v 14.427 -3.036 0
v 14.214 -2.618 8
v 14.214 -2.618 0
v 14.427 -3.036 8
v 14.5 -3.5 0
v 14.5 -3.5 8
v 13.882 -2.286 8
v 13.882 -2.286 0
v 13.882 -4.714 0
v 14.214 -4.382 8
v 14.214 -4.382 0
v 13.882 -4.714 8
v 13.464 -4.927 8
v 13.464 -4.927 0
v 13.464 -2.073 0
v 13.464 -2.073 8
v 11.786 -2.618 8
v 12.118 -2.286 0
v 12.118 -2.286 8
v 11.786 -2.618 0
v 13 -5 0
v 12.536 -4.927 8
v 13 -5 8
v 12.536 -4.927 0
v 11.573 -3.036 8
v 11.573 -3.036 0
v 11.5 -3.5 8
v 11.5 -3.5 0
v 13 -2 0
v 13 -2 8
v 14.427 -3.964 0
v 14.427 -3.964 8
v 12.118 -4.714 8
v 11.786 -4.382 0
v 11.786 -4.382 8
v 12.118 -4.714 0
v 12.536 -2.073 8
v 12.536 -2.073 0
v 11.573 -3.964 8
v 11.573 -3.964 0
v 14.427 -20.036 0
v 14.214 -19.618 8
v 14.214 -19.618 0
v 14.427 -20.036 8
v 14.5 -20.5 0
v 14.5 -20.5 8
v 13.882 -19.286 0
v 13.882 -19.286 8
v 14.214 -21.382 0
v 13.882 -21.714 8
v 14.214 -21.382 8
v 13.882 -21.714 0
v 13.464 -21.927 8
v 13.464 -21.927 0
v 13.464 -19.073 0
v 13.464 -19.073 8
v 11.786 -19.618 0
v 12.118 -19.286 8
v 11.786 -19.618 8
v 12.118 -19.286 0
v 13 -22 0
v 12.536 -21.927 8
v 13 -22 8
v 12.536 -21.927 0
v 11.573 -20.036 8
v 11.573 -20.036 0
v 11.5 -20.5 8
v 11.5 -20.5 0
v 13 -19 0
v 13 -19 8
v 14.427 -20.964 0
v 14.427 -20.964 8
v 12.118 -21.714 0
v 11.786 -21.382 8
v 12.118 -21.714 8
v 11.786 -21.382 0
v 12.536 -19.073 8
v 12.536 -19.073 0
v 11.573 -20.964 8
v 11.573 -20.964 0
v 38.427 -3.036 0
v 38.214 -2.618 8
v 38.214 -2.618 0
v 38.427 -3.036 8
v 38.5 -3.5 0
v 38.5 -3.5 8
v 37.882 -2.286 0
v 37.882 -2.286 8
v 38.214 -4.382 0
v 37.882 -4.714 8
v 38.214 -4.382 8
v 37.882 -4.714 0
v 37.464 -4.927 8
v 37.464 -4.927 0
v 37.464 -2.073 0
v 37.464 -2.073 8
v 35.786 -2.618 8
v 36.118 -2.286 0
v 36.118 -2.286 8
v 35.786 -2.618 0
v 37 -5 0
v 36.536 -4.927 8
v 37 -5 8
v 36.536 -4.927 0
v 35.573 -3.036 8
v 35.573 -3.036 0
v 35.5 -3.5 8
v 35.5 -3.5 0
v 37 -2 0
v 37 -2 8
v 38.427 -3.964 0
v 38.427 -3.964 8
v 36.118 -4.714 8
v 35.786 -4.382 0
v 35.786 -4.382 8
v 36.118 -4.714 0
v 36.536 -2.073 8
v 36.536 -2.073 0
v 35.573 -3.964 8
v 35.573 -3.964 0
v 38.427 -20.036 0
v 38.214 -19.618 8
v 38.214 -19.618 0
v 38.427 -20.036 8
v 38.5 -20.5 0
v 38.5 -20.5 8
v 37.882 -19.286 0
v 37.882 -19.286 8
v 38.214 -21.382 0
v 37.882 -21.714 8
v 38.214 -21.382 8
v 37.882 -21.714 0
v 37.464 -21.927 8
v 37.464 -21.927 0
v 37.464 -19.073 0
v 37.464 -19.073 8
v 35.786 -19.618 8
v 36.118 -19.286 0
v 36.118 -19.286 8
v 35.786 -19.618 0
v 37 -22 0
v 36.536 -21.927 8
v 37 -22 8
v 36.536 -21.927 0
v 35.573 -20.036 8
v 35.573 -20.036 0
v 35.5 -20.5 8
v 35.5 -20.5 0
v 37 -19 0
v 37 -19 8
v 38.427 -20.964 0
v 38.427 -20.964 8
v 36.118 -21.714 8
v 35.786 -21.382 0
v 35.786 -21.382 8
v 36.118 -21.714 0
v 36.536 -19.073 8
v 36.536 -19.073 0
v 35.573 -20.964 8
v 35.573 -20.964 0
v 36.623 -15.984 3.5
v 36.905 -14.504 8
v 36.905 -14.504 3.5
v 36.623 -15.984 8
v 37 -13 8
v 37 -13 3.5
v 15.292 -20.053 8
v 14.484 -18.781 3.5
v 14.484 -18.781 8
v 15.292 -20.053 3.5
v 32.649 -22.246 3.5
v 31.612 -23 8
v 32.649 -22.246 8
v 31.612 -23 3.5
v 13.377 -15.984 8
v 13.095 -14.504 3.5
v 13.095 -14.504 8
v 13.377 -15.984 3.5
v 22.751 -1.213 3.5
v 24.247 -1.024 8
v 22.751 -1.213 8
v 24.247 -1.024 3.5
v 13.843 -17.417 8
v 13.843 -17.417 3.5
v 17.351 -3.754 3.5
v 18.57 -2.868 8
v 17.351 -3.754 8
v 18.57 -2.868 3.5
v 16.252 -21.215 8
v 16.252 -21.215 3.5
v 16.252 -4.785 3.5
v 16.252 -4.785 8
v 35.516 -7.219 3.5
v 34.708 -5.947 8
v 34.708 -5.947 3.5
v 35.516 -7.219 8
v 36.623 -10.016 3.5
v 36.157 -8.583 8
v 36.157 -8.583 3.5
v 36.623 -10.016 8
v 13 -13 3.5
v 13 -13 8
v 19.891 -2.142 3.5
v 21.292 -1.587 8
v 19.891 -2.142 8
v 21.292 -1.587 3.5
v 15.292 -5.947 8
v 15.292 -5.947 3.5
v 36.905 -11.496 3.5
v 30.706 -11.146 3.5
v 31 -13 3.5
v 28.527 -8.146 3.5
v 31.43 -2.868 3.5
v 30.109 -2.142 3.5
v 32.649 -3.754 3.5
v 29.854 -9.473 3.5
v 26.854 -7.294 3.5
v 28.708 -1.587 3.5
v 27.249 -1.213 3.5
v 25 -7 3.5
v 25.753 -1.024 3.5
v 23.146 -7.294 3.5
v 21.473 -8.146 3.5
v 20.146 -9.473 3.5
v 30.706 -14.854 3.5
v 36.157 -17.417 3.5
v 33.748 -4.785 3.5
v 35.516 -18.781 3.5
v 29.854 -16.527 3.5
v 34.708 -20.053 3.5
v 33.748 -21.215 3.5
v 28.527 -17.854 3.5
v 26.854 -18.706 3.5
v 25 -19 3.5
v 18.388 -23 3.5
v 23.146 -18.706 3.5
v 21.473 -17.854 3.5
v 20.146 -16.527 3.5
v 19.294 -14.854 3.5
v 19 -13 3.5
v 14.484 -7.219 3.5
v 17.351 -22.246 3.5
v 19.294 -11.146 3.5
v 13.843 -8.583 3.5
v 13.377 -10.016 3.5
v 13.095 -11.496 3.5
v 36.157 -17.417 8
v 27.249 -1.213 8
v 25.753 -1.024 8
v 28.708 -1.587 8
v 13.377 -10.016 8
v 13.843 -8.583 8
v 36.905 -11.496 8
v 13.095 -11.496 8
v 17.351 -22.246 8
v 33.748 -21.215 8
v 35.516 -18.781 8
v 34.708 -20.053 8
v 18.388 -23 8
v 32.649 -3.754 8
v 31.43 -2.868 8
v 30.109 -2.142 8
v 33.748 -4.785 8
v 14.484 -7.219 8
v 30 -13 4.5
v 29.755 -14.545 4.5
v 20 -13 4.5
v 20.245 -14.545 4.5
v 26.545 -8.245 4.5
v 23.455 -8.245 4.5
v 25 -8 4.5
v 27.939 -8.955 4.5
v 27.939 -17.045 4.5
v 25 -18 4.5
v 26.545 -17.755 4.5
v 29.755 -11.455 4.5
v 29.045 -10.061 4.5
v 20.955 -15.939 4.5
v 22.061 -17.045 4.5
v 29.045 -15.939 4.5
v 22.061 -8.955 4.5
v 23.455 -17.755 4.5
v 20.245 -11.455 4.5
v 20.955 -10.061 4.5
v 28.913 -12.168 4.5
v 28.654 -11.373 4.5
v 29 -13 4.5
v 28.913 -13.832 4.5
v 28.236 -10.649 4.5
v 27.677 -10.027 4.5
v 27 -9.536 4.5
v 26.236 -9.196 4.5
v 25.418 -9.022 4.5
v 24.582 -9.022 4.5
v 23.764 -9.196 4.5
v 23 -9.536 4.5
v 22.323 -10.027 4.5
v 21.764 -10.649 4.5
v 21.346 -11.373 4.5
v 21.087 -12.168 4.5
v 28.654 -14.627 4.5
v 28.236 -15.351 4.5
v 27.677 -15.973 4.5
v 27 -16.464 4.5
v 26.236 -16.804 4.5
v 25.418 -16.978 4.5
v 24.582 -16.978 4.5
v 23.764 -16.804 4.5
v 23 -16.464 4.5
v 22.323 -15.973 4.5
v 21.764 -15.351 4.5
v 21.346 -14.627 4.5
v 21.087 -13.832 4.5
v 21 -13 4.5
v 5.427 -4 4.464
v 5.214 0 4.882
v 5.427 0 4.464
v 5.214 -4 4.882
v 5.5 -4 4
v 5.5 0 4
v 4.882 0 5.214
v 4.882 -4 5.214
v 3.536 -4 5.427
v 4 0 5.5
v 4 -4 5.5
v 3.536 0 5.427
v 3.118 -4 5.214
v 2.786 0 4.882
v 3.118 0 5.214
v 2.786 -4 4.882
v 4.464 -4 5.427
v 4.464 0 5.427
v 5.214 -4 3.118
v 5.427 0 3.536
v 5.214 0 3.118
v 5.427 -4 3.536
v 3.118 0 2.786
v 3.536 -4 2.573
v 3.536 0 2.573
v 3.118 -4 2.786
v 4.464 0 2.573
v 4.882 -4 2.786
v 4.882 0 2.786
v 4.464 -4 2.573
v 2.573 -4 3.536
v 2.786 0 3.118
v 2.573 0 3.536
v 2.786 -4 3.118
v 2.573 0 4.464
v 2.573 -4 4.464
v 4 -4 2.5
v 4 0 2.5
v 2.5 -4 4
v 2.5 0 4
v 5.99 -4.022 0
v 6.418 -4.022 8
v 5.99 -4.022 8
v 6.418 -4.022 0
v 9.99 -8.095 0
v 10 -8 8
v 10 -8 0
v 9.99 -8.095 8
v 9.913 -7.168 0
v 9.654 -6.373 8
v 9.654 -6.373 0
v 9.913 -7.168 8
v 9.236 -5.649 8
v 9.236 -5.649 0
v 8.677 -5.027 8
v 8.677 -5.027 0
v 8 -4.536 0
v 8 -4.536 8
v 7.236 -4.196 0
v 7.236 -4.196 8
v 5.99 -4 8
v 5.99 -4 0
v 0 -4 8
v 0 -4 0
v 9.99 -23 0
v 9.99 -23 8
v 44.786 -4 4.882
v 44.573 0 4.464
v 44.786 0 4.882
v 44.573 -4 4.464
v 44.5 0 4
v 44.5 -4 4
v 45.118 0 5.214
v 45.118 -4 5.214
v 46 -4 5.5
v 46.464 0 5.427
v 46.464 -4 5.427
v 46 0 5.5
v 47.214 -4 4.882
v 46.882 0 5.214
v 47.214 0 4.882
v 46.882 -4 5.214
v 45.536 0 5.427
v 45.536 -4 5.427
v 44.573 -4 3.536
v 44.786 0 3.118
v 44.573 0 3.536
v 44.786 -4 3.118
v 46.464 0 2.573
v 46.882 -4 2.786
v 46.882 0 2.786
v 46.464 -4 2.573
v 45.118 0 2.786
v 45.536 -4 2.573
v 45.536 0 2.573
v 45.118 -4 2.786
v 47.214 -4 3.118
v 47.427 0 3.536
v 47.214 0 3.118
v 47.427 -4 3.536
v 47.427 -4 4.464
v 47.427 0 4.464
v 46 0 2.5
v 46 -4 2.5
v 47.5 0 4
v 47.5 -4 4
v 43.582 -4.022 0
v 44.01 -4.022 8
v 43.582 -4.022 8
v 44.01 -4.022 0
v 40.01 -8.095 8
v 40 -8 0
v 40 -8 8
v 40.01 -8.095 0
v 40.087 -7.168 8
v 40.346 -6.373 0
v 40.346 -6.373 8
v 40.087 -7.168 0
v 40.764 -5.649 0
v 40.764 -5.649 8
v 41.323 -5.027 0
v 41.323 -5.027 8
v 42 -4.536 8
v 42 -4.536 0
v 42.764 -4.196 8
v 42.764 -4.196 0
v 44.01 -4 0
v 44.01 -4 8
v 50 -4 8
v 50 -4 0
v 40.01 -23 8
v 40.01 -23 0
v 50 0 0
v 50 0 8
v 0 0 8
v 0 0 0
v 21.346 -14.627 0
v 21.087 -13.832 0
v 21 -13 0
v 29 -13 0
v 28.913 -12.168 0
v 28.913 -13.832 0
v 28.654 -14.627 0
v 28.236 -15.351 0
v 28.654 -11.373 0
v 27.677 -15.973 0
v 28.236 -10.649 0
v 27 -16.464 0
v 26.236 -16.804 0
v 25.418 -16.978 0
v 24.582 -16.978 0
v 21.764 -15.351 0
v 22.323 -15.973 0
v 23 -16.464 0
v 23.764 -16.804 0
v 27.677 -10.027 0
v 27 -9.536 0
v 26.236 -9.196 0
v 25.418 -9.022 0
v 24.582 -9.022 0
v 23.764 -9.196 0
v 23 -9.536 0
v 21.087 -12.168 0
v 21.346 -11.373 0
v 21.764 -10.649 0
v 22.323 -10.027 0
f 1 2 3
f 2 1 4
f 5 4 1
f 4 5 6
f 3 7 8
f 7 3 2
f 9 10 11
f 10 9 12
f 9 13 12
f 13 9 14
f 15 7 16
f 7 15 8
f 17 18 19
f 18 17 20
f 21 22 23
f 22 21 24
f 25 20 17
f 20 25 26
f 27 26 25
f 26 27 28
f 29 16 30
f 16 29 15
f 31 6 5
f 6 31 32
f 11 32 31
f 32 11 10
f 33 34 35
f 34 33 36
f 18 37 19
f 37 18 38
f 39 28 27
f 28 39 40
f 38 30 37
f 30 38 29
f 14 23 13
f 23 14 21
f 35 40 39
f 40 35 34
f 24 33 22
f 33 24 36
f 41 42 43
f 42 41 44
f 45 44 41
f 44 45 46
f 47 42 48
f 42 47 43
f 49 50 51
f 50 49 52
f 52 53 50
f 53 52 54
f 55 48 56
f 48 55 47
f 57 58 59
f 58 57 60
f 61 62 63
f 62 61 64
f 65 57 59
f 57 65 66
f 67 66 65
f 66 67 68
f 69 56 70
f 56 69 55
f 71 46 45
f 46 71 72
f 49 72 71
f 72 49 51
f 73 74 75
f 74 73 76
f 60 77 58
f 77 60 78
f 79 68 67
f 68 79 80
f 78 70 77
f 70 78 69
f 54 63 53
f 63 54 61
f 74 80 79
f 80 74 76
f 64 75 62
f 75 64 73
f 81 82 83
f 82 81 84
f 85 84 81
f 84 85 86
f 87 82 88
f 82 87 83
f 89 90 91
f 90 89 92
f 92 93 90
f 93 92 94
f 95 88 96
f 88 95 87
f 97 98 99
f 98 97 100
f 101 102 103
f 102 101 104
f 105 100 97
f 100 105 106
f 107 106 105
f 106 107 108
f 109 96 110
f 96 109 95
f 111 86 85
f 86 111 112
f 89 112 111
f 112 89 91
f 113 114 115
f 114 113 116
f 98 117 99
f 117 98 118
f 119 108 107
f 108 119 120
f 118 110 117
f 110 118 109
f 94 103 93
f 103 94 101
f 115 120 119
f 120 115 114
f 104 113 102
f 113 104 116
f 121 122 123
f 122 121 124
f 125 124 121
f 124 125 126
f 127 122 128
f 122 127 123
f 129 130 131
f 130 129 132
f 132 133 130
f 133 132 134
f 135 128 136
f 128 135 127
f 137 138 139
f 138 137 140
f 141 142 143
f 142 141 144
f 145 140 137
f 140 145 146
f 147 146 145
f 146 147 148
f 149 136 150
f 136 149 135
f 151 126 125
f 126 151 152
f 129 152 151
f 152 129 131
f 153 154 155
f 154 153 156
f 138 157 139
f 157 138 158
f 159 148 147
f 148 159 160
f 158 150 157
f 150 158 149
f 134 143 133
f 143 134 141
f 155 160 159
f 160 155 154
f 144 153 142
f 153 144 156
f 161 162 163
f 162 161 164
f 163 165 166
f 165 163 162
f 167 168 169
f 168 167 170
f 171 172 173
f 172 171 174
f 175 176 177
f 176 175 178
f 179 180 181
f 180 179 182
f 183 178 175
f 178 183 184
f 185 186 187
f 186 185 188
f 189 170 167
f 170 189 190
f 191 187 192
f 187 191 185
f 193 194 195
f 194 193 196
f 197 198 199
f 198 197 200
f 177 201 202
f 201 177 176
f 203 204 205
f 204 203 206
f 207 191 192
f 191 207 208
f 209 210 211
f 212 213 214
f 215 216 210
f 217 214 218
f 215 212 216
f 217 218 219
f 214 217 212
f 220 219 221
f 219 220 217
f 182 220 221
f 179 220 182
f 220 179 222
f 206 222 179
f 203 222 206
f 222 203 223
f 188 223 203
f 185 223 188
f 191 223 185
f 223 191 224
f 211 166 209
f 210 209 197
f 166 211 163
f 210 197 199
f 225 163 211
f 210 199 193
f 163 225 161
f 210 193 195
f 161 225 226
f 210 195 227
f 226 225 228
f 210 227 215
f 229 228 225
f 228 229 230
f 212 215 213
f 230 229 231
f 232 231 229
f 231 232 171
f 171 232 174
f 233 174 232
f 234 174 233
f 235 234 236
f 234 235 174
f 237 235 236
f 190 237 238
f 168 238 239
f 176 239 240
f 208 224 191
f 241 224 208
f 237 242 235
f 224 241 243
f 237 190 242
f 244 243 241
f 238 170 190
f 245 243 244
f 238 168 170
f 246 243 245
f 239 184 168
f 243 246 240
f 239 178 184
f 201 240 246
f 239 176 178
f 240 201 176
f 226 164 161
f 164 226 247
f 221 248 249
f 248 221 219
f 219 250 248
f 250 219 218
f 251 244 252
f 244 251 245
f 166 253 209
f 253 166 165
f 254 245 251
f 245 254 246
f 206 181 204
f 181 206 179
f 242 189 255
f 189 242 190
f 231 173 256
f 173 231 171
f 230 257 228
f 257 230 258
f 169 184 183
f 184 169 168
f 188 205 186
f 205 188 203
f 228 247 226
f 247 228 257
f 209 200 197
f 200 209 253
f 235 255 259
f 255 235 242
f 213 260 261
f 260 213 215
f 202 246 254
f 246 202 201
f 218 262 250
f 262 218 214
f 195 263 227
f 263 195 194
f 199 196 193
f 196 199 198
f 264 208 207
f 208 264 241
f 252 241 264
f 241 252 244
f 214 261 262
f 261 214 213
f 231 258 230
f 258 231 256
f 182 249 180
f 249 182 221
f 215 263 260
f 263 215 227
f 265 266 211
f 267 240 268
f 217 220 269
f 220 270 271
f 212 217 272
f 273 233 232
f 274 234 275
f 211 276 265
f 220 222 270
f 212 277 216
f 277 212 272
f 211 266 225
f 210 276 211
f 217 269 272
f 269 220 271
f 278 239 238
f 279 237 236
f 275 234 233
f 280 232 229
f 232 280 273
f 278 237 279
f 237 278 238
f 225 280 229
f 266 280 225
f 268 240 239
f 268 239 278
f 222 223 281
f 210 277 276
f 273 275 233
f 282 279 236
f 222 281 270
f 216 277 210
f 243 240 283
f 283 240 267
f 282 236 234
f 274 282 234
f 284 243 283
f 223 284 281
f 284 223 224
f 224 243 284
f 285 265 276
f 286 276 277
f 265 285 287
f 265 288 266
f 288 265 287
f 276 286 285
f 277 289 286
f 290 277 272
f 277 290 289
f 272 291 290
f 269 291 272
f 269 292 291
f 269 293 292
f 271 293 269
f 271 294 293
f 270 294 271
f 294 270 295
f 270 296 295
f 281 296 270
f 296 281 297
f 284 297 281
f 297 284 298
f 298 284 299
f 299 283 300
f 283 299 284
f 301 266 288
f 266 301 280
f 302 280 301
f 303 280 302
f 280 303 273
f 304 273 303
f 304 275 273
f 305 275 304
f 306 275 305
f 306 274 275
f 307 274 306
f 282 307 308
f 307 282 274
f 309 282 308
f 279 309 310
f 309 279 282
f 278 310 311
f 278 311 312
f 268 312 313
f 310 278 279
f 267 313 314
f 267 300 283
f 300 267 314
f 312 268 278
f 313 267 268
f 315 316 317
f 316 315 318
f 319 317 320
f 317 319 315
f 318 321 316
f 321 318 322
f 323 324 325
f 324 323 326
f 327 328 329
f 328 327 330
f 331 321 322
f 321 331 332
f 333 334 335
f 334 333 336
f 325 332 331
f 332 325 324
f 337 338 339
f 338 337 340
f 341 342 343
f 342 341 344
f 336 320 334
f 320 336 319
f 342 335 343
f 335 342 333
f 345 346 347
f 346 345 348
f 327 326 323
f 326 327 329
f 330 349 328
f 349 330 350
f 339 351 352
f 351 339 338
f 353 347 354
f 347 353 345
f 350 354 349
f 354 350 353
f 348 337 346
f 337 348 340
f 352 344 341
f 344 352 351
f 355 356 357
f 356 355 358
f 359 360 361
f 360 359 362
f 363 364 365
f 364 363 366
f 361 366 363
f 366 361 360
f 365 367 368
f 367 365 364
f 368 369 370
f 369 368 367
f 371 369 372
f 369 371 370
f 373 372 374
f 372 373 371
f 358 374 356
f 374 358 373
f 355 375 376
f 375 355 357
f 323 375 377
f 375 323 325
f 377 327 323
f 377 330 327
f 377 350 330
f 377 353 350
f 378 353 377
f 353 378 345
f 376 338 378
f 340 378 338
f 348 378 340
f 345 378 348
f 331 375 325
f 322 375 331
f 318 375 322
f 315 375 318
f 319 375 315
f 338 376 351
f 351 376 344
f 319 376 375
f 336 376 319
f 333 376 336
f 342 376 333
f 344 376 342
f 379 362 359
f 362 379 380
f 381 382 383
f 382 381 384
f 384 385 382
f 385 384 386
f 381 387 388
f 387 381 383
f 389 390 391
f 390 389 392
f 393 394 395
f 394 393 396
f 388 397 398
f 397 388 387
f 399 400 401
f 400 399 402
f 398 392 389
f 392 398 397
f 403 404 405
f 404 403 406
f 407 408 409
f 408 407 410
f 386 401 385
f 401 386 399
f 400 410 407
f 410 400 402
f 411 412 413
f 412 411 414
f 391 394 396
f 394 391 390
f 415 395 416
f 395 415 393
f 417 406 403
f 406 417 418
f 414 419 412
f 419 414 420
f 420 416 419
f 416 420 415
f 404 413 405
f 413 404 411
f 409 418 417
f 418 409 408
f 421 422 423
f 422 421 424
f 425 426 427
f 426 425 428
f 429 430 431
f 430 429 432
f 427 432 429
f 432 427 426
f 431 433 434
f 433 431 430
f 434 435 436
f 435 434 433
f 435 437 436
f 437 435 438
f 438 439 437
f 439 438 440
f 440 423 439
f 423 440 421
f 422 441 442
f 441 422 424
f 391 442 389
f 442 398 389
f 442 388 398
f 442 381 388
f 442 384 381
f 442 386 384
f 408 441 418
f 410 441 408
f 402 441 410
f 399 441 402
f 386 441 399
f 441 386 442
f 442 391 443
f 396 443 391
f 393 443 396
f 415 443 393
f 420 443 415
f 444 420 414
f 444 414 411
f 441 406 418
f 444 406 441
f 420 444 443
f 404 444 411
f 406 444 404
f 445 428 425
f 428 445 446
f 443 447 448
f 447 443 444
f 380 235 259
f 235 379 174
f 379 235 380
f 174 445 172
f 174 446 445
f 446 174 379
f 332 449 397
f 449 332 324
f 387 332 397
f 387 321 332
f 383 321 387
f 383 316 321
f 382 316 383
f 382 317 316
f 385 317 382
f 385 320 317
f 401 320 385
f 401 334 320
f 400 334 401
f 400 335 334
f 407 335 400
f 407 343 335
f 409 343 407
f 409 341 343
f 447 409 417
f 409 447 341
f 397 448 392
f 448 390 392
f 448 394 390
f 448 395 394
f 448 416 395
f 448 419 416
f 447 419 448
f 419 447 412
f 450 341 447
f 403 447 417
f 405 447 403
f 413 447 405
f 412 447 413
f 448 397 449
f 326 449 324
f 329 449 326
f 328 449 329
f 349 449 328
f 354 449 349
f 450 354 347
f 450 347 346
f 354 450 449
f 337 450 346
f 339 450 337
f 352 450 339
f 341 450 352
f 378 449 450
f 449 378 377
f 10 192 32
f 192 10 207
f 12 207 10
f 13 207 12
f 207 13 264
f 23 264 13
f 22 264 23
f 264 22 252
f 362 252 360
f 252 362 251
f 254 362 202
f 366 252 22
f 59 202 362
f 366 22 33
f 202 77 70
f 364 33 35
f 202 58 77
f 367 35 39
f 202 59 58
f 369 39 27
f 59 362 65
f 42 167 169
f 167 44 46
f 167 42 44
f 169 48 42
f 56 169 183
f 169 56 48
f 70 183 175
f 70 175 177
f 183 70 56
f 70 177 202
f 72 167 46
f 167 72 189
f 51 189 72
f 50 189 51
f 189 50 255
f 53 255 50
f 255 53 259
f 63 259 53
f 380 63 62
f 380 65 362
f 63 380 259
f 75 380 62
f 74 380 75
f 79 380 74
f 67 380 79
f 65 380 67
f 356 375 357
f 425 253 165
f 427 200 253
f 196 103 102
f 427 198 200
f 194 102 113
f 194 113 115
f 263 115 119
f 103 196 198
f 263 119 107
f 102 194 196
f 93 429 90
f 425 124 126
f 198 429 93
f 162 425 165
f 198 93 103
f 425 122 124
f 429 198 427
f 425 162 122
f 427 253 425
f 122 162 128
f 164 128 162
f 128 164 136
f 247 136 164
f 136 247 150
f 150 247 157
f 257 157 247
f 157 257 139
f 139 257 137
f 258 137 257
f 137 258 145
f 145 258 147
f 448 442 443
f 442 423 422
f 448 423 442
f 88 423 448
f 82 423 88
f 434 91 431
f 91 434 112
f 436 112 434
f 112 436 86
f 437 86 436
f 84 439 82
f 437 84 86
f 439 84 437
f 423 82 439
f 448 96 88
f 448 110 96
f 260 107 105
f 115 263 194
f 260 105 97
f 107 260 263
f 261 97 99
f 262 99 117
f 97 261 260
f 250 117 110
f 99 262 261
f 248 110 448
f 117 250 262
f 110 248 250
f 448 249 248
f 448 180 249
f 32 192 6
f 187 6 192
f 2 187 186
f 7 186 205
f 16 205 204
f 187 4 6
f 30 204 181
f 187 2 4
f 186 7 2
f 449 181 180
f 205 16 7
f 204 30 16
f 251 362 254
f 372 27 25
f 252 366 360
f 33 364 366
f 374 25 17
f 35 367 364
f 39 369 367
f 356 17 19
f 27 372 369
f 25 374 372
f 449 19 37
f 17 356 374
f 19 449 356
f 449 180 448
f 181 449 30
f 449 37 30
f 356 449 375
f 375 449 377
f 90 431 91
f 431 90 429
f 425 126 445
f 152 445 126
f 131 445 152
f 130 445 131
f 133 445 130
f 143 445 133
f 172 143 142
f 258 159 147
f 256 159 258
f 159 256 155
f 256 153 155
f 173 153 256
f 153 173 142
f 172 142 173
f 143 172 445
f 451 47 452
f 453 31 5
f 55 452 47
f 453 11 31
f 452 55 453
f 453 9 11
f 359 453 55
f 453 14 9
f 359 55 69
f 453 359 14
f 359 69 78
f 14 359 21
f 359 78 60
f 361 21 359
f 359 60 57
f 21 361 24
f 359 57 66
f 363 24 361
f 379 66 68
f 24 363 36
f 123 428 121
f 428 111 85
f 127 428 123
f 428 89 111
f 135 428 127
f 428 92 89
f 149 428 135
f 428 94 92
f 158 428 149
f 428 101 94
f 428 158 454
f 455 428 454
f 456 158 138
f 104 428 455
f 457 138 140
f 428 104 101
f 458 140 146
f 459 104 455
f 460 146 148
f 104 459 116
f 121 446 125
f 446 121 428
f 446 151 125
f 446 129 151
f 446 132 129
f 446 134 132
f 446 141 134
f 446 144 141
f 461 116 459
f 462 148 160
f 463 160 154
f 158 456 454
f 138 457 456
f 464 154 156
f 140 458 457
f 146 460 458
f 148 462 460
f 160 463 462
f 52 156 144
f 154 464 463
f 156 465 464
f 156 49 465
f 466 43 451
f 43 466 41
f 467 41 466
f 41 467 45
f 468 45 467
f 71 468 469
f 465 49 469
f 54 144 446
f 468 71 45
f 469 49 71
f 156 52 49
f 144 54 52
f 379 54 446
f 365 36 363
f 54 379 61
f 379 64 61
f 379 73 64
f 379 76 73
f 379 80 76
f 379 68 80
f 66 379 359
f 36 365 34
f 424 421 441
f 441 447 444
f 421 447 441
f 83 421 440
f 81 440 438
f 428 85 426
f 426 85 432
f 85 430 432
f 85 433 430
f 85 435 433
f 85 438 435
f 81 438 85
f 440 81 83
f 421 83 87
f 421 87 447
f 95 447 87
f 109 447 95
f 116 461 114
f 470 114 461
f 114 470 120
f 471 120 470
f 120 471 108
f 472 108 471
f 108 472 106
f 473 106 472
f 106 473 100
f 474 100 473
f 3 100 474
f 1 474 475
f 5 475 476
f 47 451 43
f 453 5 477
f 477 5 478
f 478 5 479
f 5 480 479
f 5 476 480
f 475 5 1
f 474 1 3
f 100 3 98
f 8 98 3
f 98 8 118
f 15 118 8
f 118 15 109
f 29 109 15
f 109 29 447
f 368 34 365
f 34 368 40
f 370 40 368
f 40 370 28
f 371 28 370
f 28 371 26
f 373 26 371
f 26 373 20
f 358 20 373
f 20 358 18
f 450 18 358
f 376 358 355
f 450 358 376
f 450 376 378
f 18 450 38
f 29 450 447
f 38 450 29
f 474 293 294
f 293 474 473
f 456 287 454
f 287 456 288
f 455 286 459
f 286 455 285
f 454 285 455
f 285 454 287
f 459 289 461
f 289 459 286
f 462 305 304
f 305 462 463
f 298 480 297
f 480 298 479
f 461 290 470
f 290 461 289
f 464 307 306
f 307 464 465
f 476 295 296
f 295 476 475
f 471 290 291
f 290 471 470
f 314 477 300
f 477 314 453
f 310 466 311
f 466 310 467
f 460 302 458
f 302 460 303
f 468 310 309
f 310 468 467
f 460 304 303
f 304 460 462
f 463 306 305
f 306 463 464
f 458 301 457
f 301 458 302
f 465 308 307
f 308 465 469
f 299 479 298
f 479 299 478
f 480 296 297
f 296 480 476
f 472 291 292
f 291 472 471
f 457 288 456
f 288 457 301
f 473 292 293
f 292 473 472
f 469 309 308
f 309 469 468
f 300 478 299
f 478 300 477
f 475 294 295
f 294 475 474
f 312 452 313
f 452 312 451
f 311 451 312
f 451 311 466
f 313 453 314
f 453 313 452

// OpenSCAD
rotate([90,0]) difference(){
  cube([50,8,23]);
  for(x=[13,37],z=[3.5,20.5])
  translate([x,-.01,z]) rotate([-90,0]) cylinder(d=3,h=20,$fn=20);
  translate([25,12.5,13]) rotate([90,0]) difference(){
    union(){
      cylinder(d=24,h=9,$fn=50);
     *translate([-12,0]) cube([24,12,9]);
    }
    translate([0,0,-.01]) cylinder(d1=12,d2=8,h=1,$fn=20);
    translate([0,0,8]) cylinder(d1=10,d2=12,h=1,$fn=20);
  }
  translate([25,-.01,13]) rotate([-90,0]) 
    cylinder(d=8,h=20,$fn=30);
  for(m=[0,1]) translate([25,0]) mirror([m,0]) translate([-25,0]) {
    translate([6,-.01,8]) rotate([-90,0]) scale([1,1]) cylinder(d=8,h=20,$fn=30);
    translate([-.01,-.01,4]) cube([6,20,30]);
    for(y=[4,12])
      translate([4,y,-.01]) cylinder(d=3,h=10,$fn=20);
  translate([-.01,-.01,8]) cube([10,20,30]);
  }
}
*%translate([25,12,12]) rotate([90,0]) difference() {
  cylinder(d=22,h=7,$fn=50);
  translate([0,0,-.01]) cylinder(d=8,h=7.02,$fn=30);
}
